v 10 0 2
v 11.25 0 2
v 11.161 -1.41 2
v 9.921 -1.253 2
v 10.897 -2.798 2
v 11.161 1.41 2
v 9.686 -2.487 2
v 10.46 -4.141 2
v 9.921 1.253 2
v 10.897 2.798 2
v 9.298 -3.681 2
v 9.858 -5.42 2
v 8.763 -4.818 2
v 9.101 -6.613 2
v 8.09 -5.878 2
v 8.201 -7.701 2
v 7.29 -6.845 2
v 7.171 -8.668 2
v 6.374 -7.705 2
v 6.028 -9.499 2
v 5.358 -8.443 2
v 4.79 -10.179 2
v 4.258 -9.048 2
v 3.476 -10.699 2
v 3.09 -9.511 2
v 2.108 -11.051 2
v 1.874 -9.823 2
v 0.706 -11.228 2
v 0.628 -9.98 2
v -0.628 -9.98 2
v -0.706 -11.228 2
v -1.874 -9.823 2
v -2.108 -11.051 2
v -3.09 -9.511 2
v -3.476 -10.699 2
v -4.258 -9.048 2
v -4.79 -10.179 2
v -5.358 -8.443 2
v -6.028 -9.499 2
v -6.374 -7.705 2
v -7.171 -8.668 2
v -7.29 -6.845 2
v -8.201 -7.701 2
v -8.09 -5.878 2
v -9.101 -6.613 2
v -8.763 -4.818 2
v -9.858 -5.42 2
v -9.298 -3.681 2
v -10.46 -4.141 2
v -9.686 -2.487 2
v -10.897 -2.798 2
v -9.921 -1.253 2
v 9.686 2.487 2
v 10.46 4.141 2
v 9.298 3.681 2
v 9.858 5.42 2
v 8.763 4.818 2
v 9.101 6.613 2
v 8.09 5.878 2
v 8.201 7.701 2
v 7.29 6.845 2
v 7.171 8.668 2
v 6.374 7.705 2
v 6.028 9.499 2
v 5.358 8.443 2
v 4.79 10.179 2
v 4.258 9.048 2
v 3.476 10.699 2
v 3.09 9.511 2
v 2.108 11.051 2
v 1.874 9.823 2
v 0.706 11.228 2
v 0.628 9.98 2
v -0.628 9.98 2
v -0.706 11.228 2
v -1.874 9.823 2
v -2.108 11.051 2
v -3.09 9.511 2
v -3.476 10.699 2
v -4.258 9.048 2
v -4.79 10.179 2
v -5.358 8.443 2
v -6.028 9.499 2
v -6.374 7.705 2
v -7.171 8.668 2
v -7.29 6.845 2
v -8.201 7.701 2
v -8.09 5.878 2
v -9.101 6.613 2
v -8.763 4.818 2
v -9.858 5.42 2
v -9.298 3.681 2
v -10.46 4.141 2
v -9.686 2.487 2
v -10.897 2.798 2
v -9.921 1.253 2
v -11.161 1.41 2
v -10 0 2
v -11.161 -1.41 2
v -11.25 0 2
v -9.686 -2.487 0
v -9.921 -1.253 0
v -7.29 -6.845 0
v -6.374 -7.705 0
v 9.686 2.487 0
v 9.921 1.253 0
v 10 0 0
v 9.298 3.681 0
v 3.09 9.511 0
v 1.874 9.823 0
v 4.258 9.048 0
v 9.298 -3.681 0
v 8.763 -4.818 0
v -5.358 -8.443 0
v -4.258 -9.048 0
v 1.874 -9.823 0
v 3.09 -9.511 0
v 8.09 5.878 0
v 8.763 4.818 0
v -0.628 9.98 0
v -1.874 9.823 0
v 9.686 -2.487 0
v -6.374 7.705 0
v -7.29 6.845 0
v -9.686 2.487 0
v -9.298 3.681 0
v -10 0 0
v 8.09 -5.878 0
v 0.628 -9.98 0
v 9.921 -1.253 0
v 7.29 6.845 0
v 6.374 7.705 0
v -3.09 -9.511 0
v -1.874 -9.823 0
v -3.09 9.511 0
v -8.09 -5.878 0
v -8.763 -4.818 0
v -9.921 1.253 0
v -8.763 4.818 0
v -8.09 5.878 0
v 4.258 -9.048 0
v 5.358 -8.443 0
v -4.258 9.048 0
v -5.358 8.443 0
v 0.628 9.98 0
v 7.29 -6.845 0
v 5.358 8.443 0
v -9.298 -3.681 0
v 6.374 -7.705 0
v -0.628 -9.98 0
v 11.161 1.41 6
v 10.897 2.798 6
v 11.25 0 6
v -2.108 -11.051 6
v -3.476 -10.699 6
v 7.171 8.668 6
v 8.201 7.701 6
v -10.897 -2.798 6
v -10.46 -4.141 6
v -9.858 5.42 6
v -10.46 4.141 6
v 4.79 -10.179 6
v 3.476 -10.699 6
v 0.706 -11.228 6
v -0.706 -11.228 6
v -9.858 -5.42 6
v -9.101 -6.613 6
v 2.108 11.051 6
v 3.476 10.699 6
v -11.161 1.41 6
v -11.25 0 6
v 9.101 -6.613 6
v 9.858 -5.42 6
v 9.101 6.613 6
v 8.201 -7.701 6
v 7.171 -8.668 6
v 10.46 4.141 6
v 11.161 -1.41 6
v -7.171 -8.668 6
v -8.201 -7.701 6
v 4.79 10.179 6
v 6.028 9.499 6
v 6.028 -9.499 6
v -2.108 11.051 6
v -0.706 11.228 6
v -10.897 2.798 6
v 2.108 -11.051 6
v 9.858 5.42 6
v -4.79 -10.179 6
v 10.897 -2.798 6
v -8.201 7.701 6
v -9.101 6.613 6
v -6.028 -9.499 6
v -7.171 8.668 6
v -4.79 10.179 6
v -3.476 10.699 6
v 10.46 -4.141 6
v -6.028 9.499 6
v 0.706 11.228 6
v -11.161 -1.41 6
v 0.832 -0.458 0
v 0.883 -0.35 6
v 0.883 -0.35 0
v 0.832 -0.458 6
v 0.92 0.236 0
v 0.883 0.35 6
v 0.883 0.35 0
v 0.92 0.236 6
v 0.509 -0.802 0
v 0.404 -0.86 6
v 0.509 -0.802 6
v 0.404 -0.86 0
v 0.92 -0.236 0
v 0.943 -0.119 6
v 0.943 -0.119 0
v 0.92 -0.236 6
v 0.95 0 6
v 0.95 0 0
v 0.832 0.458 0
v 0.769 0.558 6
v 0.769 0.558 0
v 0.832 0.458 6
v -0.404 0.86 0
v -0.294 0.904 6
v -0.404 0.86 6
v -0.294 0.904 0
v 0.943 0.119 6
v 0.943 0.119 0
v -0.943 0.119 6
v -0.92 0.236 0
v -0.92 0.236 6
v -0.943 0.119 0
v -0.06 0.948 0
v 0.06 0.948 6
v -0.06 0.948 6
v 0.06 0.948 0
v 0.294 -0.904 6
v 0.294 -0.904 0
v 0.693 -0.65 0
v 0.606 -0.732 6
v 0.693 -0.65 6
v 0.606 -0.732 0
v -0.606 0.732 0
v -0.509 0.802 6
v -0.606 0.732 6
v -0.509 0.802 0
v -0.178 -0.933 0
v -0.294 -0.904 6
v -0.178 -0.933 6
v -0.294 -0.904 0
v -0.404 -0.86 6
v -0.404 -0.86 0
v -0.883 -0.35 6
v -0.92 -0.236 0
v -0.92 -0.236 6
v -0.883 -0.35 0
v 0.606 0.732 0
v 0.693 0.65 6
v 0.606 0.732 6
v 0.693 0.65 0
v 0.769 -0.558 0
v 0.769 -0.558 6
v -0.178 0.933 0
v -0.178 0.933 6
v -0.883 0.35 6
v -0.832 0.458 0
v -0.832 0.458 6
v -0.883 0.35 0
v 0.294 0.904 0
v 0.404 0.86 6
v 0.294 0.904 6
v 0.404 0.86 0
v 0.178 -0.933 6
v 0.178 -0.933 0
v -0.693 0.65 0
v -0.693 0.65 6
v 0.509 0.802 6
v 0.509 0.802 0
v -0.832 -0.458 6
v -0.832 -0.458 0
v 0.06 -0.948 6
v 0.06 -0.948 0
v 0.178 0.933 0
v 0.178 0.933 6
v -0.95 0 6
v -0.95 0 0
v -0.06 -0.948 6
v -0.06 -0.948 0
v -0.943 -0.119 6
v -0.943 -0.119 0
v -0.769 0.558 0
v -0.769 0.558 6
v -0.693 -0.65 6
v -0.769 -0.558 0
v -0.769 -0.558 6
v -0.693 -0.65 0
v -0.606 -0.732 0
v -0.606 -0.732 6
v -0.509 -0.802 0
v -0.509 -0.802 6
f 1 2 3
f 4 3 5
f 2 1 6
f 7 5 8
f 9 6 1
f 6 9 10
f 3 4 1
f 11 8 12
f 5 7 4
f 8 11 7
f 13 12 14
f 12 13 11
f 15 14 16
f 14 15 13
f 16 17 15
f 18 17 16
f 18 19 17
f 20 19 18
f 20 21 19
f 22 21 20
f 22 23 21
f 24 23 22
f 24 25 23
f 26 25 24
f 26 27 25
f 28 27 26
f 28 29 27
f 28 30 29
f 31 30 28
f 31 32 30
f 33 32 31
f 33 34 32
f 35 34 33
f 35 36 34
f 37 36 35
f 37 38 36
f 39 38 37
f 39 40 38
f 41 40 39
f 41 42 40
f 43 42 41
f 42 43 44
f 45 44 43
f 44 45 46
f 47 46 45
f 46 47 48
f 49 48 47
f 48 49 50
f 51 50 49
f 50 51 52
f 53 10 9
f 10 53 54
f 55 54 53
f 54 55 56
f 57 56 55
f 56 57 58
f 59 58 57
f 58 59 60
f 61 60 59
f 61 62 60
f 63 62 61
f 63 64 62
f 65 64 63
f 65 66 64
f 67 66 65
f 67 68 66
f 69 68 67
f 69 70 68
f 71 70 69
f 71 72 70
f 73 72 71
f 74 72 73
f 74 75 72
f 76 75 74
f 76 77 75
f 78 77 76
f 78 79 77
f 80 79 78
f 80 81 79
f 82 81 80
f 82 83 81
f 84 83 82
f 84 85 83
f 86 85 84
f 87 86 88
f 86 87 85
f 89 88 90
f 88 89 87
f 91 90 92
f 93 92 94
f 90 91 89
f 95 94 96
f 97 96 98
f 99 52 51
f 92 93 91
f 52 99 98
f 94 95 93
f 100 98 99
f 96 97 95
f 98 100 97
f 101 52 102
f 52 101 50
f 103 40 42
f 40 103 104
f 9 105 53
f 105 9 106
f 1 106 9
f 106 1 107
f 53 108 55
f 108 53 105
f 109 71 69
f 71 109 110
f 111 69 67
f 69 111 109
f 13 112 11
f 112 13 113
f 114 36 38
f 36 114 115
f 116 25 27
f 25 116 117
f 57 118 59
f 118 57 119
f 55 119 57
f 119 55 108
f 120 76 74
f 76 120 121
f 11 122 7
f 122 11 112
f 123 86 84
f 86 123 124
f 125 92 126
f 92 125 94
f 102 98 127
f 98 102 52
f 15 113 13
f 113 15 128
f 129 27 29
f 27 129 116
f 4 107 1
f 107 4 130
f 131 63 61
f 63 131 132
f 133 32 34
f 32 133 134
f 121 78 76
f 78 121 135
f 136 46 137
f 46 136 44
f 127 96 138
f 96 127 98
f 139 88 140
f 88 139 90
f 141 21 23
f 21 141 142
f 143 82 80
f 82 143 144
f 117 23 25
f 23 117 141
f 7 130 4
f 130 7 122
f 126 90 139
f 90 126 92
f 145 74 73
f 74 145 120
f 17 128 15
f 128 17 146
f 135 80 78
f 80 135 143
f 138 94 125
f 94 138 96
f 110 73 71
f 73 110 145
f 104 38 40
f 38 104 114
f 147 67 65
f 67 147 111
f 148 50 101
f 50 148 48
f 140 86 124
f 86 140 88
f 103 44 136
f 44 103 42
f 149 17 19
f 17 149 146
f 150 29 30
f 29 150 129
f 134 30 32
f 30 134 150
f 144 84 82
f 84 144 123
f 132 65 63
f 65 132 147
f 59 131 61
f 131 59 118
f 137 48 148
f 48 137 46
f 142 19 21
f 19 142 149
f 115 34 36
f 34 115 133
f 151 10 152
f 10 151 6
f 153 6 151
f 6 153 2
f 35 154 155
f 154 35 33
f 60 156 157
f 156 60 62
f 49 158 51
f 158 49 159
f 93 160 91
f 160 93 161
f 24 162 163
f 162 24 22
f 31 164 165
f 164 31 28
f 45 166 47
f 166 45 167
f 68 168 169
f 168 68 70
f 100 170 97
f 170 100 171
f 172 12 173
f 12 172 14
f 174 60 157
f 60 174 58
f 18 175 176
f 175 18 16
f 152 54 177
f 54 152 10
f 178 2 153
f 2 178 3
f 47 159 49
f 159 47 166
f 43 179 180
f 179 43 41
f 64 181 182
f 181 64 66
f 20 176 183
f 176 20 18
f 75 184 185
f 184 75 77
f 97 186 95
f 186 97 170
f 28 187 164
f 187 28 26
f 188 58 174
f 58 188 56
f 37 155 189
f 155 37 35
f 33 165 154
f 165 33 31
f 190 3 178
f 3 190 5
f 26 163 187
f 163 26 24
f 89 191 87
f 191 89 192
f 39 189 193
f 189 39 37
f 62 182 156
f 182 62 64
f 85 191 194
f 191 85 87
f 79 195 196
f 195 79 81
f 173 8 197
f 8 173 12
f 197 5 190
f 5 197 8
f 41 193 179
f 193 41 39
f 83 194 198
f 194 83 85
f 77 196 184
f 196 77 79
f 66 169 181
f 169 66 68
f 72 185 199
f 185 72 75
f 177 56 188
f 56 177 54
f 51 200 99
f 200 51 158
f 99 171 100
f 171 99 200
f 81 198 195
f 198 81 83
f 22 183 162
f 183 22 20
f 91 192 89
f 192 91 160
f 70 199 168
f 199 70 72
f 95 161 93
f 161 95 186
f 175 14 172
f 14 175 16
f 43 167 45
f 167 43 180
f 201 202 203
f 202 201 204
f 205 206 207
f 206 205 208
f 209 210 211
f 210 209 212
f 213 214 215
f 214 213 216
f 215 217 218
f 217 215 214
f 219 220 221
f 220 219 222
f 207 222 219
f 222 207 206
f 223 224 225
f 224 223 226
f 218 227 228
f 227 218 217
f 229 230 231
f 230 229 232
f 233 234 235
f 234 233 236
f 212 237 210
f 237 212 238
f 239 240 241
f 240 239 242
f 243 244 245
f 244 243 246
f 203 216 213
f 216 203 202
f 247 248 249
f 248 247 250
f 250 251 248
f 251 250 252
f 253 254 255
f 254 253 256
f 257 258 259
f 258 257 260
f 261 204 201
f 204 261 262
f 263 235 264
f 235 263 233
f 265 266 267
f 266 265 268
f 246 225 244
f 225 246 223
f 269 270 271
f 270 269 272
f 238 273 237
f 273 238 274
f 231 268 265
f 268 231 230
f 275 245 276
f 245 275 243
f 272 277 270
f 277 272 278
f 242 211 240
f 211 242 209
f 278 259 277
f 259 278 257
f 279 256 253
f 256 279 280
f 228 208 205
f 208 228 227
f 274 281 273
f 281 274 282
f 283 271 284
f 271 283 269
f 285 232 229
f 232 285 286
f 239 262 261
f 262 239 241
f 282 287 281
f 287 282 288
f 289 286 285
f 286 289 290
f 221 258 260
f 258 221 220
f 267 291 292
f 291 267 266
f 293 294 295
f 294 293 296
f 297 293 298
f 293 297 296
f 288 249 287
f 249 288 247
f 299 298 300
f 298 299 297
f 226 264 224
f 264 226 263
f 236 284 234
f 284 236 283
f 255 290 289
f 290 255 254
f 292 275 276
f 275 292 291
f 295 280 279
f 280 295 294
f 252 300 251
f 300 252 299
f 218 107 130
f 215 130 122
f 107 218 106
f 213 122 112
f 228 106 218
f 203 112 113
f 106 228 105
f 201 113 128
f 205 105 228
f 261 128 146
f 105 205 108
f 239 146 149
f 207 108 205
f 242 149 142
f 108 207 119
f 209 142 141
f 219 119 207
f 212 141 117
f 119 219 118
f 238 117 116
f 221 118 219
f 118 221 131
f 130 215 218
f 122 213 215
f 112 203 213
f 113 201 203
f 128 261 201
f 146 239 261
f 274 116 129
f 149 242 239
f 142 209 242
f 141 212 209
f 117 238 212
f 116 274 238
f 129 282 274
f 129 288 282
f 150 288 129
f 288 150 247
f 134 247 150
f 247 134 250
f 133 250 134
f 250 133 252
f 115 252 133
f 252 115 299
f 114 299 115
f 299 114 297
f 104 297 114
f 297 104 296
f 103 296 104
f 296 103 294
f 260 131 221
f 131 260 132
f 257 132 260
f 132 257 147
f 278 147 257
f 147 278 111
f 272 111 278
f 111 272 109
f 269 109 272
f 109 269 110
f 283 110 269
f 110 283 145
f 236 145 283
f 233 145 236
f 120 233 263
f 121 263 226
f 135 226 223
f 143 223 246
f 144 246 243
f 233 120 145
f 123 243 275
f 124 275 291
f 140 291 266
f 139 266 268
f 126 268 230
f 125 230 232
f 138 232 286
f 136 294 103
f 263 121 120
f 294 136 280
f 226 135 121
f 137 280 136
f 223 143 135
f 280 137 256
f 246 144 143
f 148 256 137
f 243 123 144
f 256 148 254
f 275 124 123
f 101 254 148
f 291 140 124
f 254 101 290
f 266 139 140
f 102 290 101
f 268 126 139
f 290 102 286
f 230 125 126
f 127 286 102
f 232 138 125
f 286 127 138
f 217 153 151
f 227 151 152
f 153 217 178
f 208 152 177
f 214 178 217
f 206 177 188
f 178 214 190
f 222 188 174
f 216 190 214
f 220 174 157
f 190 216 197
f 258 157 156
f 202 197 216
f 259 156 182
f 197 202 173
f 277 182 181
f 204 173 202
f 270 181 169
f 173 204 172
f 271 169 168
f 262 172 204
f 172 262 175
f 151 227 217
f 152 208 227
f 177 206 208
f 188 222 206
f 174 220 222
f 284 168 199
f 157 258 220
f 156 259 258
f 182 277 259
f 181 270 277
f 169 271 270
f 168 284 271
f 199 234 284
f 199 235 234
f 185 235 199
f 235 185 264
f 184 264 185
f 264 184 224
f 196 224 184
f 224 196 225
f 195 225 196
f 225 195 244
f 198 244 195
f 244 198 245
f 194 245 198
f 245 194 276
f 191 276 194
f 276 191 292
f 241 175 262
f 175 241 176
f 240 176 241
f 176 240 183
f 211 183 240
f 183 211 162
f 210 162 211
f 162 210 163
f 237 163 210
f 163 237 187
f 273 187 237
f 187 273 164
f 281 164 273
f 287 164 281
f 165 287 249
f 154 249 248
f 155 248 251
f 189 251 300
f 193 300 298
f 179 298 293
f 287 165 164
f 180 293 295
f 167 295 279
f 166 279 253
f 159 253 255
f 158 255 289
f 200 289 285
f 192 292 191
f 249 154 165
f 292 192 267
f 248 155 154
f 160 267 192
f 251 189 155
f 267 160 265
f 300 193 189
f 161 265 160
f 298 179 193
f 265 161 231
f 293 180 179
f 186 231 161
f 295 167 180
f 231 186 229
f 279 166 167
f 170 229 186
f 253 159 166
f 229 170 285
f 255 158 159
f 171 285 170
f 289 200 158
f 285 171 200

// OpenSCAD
$fn = 50;


difference() {
	union() {
		*color(alpha = 1.0000000000, c = "gray") {
			translate(v = [0, 7, 0]) {
				linear_extrude(height = 12) {
					text(font = "Arial:style=Bold", halign = "center", size = 4.5000000000, text = "COMMENT bearing_plate_plate", valign = "center");
				}
			}
		}
		*color(alpha = 1.0000000000, c = "gray") {
			translate(v = [0, 14, 0]) {
				linear_extrude(height = 12) {
					text(font = "Arial:style=Bold", halign = "center", size = 4.5000000000, text = "COMMENT description oobb_cylinder_shape_p_type_12_depth_3_width_12_height_12_thickness_motor_n20_shaft_p_t_12.0_radius_all_mode", valign = "center");
				}
			}
		}
		translate(v = [0, 0, -6.0000000000]) {
			cylinder(h = 12, r = 12.0000000000);
		}
		*color(alpha = 1.0000000000, c = "gray") {
			translate(v = [0, 7, 0]) {
				linear_extrude(height = 1) {
					text(font = "Arial:style=Bold", halign = "center", size = 4.5000000000, text = "COMMENT bearing_plate_slice", valign = "center");
				}
			}
		}
	}
	union() {
		translate(v = [18.0000000000, 0, -6.0000000000]) {
			rotate(a = [0, 180, 30.0000000000]) {
				difference() {
					union() {
						translate(v = [0, 0, -0.8500000000]) {
							cylinder(r1 = 1.5000000000, r2 = 2.4000000000);
						}
						translate(v = [0, 0, -12.0000000000]) {
							cylinder(h = 12, r = 1.5000000000);
						}
						translate(v = [0, 0, -12.0000000000]) {
							linear_extrude(height = 2.5000000000) {
								polygon(points = [[3.1735000000, 0.0000000000], [1.5867500000, 2.7483316189], [-1.5867500000, 2.7483316189], [-3.1735000000, 0.0000000000], [-1.5867500000, -2.7483316189], [1.5867500000, -2.7483316189]]);
							}
						}
						translate(v = [0, 0, -12.0000000000]) {
							cylinder(h = 12, r = 1.8000000000);
						}
						translate(v = [0, 0, -12.0000000000]) {
							linear_extrude(height = 2.5000000000) {
								polygon(points = [[3.1735000000, 0.0000000000], [1.5867500000, 2.7483316189], [-1.5867500000, 2.7483316189], [-3.1735000000, 0.0000000000], [-1.5867500000, -2.7483316189], [1.5867500000, -2.7483316189]]);
							}
						}
						translate(v = [0, 0, -12.0000000000]) {
							cylinder(h = 12, r = 1.5000000000);
						}
						translate(v = [0, 0, -12.0000000000]) {
							linear_extrude(height = 2.5000000000) {
								polygon(points = [[3.1735000000, 0.0000000000], [1.5867500000, 2.7483316189], [-1.5867500000, 2.7483316189], [-3.1735000000, 0.0000000000], [-1.5867500000, -2.7483316189], [1.5867500000, -2.7483316189]]);
							}
						}
					}
					union();
				}
			}
		}
		translate(v = [-18.0000000000, 0, -6.0000000000]) {
			rotate(a = [0, 180, 30.0000000000]) {
				difference() {
					union() {
						translate(v = [0, 0, -0.8500000000]) {
							cylinder(r1 = 1.5000000000, r2 = 2.4000000000);
						}
						translate(v = [0, 0, -12.0000000000]) {
							cylinder(h = 12, r = 1.5000000000);
						}
						translate(v = [0, 0, -12.0000000000]) {
							linear_extrude(height = 2.5000000000) {
								polygon(points = [[3.1735000000, 0.0000000000], [1.5867500000, 2.7483316189], [-1.5867500000, 2.7483316189], [-3.1735000000, 0.0000000000], [-1.5867500000, -2.7483316189], [1.5867500000, -2.7483316189]]);
							}
						}
						translate(v = [0, 0, -12.0000000000]) {
							cylinder(h = 12, r = 1.8000000000);
						}
						translate(v = [0, 0, -12.0000000000]) {
							linear_extrude(height = 2.5000000000) {
								polygon(points = [[3.1735000000, 0.0000000000], [1.5867500000, 2.7483316189], [-1.5867500000, 2.7483316189], [-3.1735000000, 0.0000000000], [-1.5867500000, -2.7483316189], [1.5867500000, -2.7483316189]]);
							}
						}
						translate(v = [0, 0, -12.0000000000]) {
							cylinder(h = 12, r = 1.5000000000);
						}
						translate(v = [0, 0, -12.0000000000]) {
							linear_extrude(height = 2.5000000000) {
								polygon(points = [[3.1735000000, 0.0000000000], [1.5867500000, 2.7483316189], [-1.5867500000, 2.7483316189], [-3.1735000000, 0.0000000000], [-1.5867500000, -2.7483316189], [1.5867500000, -2.7483316189]]);
							}
						}
					}
					union();
				}
			}
		}
		translate(v = [0, 18.0000000000, 6.0000000000]) {
			rotate(a = [0, 0, 0]) {
				difference() {
					union() {
						translate(v = [0, 0, -0.8500000000]) {
							cylinder(r1 = 1.5000000000, r2 = 2.4000000000);
						}
						translate(v = [0, 0, -12.0000000000]) {
							cylinder(h = 12, r = 1.5000000000);
						}
						translate(v = [0, 0, -12.0000000000]) {
							linear_extrude(height = 2.5000000000) {
								polygon(points = [[3.1735000000, 0.0000000000], [1.5867500000, 2.7483316189], [-1.5867500000, 2.7483316189], [-3.1735000000, 0.0000000000], [-1.5867500000, -2.7483316189], [1.5867500000, -2.7483316189]]);
							}
						}
						translate(v = [0, 0, -12.0000000000]) {
							cylinder(h = 12, r = 1.8000000000);
						}
						translate(v = [0, 0, -12.0000000000]) {
							linear_extrude(height = 2.5000000000) {
								polygon(points = [[3.1735000000, 0.0000000000], [1.5867500000, 2.7483316189], [-1.5867500000, 2.7483316189], [-3.1735000000, 0.0000000000], [-1.5867500000, -2.7483316189], [1.5867500000, -2.7483316189]]);
							}
						}
						translate(v = [0, 0, -12.0000000000]) {
							cylinder(h = 12, r = 1.5000000000);
						}
						translate(v = [0, 0, -12.0000000000]) {
							linear_extrude(height = 2.5000000000) {
								polygon(points = [[3.1735000000, 0.0000000000], [1.5867500000, 2.7483316189], [-1.5867500000, 2.7483316189], [-3.1735000000, 0.0000000000], [-1.5867500000, -2.7483316189], [1.5867500000, -2.7483316189]]);
							}
						}
					}
					union();
				}
			}
		}
		translate(v = [0, -18.0000000000, 6.0000000000]) {
			rotate(a = [0, 0, 0]) {
				difference() {
					union() {
						translate(v = [0, 0, -0.8500000000]) {
							cylinder(r1 = 1.5000000000, r2 = 2.4000000000);
						}
						translate(v = [0, 0, -12.0000000000]) {
							cylinder(h = 12, r = 1.5000000000);
						}
						translate(v = [0, 0, -12.0000000000]) {
							linear_extrude(height = 2.5000000000) {
								polygon(points = [[3.1735000000, 0.0000000000], [1.5867500000, 2.7483316189], [-1.5867500000, 2.7483316189], [-3.1735000000, 0.0000000000], [-1.5867500000, -2.7483316189], [1.5867500000, -2.7483316189]]);
							}
						}
						translate(v = [0, 0, -12.0000000000]) {
							cylinder(h = 12, r = 1.8000000000);
						}
						translate(v = [0, 0, -12.0000000000]) {
							linear_extrude(height = 2.5000000000) {
								polygon(points = [[3.1735000000, 0.0000000000], [1.5867500000, 2.7483316189], [-1.5867500000, 2.7483316189], [-3.1735000000, 0.0000000000], [-1.5867500000, -2.7483316189], [1.5867500000, -2.7483316189]]);
							}
						}
						translate(v = [0, 0, -12.0000000000]) {
							cylinder(h = 12, r = 1.5000000000);
						}
						translate(v = [0, 0, -12.0000000000]) {
							linear_extrude(height = 2.5000000000) {
								polygon(points = [[3.1735000000, 0.0000000000], [1.5867500000, 2.7483316189], [-1.5867500000, 2.7483316189], [-3.1735000000, 0.0000000000], [-1.5867500000, -2.7483316189], [1.5867500000, -2.7483316189]]);
							}
						}
					}
					union();
				}
			}
		}
		*color(alpha = 1.0000000000, c = "gray") {
			translate(v = [0, 14, 0]) {
				linear_extrude(height = 3) {
					text(font = "Arial:style=Bold", halign = "center", size = 4.5000000000, text = "COMMENT description oobb_bearing_shape_n_type_12_depth_3_width_3_height_12_thickness_motor_n20_shaft_6704_bearing", valign = "center");
				}
			}
		}
		translate(v = [0, 0, -2.0000000000]) {
			union() {
				difference() {
					cylinder(h = 4, r = 13.5000000000);
					cylinder(h = 4, r = 10.0000000000);
				}
				difference() {
					translate(v = [0, 0, -50]) {
						cylinder(h = 100, r = 12.2500000000);
					}
					translate(v = [0, 0, -50]) {
						cylinder(h = 100, r = 11.2500000000);
					}
				}
			}
		}
		*color(alpha = 1.0000000000, c = "gray") {
			translate(v = [0, 14, 0]) {
				linear_extrude(height = 3) {
					text(font = "Arial:style=Bold", halign = "center", size = 4.5000000000, text = "COMMENT description oobb_holes_shape_n_type_m6_radius_name_3_width_3_height_12_thickness_motor_n20_shaft_perimeter_miss_middle_holes", valign = "center");
				}
			}
		}
		translate(v = [-15.0000000000, -15.0000000000, -50.0000000000]) {
			cylinder(h = 100, r = 3.0000000000);
		}
		translate(v = [-15.0000000000, 15.0000000000, -50.0000000000]) {
			cylinder(h = 100, r = 3.0000000000);
		}
		translate(v = [15.0000000000, -15.0000000000, -50.0000000000]) {
			cylinder(h = 100, r = 3.0000000000);
		}
		translate(v = [15.0000000000, 15.0000000000, -50.0000000000]) {
			cylinder(h = 100, r = 3.0000000000);
		}
		*color(alpha = 1.0000000000, c = "gray") {
			translate(v = [0, 14, 0]) {
				linear_extrude(height = 3) {
					text(font = "Arial:style=Bold", halign = "center", size = 4.5000000000, text = "COMMENT description oobb_motor_n20_shape_n_type_3_width_3_height_12_thickness_motor_n20_shaft_shaft_part", valign = "center");
				}
			}
		}
		translate(v = [0, 0, 125]) {
			difference() {
				#translate(v = [0, 0, -250]) {
					cylinder(h = 250, r = 0.9500000000);
				}
				#translate(v = [0, -0.8000000000, -250]) {
					cube(size = [1.9000000000, -0.8000000000, 250]);
				}
			}
		}
		*color(alpha = 1.0000000000, c = "gray") {
			translate(v = [18.0000000000, 14, -6.0000000000]) {
				rotate(a = [0, 180, 30.0000000000]) {
					linear_extrude(height = 3) {
						text(font = "Arial:style=Bold", halign = "center", size = 4.5000000000, text = "COMMENT description oobb_screw_countersunk_shape_n_type_m3_radius_name_12_depth_18.0_0_-6.0_pos_3_width_3_height_12_thickness_motor_n20_shaft_0_180_30.0_rot_true_nut_true_overhang", valign = "center");
					}
				}
			}
		}
		*color(alpha = 1.0000000000, c = "gray") {
			translate(v = [-18.0000000000, 14, -6.0000000000]) {
				rotate(a = [0, 180, 30.0000000000]) {
					linear_extrude(height = 3) {
						text(font = "Arial:style=Bold", halign = "center", size = 4.5000000000, text = "COMMENT description oobb_screw_countersunk_shape_n_type_m3_radius_name_12_depth_-18.0_0_-6.0_pos_3_width_3_height_12_thickness_motor_n20_shaft_0_180_30.0_rot_true_nut_true_overhang", valign = "center");
					}
				}
			}
		}
		*color(alpha = 1.0000000000, c = "gray") {
			translate(v = [0, 32.0000000000, 6.0000000000]) {
				linear_extrude(height = 3) {
					text(font = "Arial:style=Bold", halign = "center", size = 4.5000000000, text = "COMMENT description oobb_screw_countersunk_shape_n_type_m3_radius_name_12_depth_0_18.0_6.0_pos_3_width_3_height_12_thickness_motor_n20_shaft_0_0_0_rot_true_nut_true_overhang", valign = "center");
				}
			}
		}
		*color(alpha = 1.0000000000, c = "gray") {
			translate(v = [0, -4.0000000000, 6.0000000000]) {
				linear_extrude(height = 3) {
					text(font = "Arial:style=Bold", halign = "center", size = 4.5000000000, text = "COMMENT description oobb_screw_countersunk_shape_n_type_m3_radius_name_12_depth_0_-18.0_6.0_pos_3_width_3_height_12_thickness_motor_n20_shaft_0_0_0_rot_true_nut_true_overhang", valign = "center");
				}
			}
		}
		*color(alpha = 1.0000000000, c = "gray") {
			translate(v = [0, 14, 0]) {
				linear_extrude(height = 1) {
					text(font = "Arial:style=Bold", halign = "center", size = 4.5000000000, text = "COMMENT description oobb_slice_shape_n_type_3dpr_mode_top_zz", valign = "center");
				}
			}
		}
		translate(v = [-250, -250, -500]) {
			cube(size = [500, 500, 500]);
		}
	}
}
